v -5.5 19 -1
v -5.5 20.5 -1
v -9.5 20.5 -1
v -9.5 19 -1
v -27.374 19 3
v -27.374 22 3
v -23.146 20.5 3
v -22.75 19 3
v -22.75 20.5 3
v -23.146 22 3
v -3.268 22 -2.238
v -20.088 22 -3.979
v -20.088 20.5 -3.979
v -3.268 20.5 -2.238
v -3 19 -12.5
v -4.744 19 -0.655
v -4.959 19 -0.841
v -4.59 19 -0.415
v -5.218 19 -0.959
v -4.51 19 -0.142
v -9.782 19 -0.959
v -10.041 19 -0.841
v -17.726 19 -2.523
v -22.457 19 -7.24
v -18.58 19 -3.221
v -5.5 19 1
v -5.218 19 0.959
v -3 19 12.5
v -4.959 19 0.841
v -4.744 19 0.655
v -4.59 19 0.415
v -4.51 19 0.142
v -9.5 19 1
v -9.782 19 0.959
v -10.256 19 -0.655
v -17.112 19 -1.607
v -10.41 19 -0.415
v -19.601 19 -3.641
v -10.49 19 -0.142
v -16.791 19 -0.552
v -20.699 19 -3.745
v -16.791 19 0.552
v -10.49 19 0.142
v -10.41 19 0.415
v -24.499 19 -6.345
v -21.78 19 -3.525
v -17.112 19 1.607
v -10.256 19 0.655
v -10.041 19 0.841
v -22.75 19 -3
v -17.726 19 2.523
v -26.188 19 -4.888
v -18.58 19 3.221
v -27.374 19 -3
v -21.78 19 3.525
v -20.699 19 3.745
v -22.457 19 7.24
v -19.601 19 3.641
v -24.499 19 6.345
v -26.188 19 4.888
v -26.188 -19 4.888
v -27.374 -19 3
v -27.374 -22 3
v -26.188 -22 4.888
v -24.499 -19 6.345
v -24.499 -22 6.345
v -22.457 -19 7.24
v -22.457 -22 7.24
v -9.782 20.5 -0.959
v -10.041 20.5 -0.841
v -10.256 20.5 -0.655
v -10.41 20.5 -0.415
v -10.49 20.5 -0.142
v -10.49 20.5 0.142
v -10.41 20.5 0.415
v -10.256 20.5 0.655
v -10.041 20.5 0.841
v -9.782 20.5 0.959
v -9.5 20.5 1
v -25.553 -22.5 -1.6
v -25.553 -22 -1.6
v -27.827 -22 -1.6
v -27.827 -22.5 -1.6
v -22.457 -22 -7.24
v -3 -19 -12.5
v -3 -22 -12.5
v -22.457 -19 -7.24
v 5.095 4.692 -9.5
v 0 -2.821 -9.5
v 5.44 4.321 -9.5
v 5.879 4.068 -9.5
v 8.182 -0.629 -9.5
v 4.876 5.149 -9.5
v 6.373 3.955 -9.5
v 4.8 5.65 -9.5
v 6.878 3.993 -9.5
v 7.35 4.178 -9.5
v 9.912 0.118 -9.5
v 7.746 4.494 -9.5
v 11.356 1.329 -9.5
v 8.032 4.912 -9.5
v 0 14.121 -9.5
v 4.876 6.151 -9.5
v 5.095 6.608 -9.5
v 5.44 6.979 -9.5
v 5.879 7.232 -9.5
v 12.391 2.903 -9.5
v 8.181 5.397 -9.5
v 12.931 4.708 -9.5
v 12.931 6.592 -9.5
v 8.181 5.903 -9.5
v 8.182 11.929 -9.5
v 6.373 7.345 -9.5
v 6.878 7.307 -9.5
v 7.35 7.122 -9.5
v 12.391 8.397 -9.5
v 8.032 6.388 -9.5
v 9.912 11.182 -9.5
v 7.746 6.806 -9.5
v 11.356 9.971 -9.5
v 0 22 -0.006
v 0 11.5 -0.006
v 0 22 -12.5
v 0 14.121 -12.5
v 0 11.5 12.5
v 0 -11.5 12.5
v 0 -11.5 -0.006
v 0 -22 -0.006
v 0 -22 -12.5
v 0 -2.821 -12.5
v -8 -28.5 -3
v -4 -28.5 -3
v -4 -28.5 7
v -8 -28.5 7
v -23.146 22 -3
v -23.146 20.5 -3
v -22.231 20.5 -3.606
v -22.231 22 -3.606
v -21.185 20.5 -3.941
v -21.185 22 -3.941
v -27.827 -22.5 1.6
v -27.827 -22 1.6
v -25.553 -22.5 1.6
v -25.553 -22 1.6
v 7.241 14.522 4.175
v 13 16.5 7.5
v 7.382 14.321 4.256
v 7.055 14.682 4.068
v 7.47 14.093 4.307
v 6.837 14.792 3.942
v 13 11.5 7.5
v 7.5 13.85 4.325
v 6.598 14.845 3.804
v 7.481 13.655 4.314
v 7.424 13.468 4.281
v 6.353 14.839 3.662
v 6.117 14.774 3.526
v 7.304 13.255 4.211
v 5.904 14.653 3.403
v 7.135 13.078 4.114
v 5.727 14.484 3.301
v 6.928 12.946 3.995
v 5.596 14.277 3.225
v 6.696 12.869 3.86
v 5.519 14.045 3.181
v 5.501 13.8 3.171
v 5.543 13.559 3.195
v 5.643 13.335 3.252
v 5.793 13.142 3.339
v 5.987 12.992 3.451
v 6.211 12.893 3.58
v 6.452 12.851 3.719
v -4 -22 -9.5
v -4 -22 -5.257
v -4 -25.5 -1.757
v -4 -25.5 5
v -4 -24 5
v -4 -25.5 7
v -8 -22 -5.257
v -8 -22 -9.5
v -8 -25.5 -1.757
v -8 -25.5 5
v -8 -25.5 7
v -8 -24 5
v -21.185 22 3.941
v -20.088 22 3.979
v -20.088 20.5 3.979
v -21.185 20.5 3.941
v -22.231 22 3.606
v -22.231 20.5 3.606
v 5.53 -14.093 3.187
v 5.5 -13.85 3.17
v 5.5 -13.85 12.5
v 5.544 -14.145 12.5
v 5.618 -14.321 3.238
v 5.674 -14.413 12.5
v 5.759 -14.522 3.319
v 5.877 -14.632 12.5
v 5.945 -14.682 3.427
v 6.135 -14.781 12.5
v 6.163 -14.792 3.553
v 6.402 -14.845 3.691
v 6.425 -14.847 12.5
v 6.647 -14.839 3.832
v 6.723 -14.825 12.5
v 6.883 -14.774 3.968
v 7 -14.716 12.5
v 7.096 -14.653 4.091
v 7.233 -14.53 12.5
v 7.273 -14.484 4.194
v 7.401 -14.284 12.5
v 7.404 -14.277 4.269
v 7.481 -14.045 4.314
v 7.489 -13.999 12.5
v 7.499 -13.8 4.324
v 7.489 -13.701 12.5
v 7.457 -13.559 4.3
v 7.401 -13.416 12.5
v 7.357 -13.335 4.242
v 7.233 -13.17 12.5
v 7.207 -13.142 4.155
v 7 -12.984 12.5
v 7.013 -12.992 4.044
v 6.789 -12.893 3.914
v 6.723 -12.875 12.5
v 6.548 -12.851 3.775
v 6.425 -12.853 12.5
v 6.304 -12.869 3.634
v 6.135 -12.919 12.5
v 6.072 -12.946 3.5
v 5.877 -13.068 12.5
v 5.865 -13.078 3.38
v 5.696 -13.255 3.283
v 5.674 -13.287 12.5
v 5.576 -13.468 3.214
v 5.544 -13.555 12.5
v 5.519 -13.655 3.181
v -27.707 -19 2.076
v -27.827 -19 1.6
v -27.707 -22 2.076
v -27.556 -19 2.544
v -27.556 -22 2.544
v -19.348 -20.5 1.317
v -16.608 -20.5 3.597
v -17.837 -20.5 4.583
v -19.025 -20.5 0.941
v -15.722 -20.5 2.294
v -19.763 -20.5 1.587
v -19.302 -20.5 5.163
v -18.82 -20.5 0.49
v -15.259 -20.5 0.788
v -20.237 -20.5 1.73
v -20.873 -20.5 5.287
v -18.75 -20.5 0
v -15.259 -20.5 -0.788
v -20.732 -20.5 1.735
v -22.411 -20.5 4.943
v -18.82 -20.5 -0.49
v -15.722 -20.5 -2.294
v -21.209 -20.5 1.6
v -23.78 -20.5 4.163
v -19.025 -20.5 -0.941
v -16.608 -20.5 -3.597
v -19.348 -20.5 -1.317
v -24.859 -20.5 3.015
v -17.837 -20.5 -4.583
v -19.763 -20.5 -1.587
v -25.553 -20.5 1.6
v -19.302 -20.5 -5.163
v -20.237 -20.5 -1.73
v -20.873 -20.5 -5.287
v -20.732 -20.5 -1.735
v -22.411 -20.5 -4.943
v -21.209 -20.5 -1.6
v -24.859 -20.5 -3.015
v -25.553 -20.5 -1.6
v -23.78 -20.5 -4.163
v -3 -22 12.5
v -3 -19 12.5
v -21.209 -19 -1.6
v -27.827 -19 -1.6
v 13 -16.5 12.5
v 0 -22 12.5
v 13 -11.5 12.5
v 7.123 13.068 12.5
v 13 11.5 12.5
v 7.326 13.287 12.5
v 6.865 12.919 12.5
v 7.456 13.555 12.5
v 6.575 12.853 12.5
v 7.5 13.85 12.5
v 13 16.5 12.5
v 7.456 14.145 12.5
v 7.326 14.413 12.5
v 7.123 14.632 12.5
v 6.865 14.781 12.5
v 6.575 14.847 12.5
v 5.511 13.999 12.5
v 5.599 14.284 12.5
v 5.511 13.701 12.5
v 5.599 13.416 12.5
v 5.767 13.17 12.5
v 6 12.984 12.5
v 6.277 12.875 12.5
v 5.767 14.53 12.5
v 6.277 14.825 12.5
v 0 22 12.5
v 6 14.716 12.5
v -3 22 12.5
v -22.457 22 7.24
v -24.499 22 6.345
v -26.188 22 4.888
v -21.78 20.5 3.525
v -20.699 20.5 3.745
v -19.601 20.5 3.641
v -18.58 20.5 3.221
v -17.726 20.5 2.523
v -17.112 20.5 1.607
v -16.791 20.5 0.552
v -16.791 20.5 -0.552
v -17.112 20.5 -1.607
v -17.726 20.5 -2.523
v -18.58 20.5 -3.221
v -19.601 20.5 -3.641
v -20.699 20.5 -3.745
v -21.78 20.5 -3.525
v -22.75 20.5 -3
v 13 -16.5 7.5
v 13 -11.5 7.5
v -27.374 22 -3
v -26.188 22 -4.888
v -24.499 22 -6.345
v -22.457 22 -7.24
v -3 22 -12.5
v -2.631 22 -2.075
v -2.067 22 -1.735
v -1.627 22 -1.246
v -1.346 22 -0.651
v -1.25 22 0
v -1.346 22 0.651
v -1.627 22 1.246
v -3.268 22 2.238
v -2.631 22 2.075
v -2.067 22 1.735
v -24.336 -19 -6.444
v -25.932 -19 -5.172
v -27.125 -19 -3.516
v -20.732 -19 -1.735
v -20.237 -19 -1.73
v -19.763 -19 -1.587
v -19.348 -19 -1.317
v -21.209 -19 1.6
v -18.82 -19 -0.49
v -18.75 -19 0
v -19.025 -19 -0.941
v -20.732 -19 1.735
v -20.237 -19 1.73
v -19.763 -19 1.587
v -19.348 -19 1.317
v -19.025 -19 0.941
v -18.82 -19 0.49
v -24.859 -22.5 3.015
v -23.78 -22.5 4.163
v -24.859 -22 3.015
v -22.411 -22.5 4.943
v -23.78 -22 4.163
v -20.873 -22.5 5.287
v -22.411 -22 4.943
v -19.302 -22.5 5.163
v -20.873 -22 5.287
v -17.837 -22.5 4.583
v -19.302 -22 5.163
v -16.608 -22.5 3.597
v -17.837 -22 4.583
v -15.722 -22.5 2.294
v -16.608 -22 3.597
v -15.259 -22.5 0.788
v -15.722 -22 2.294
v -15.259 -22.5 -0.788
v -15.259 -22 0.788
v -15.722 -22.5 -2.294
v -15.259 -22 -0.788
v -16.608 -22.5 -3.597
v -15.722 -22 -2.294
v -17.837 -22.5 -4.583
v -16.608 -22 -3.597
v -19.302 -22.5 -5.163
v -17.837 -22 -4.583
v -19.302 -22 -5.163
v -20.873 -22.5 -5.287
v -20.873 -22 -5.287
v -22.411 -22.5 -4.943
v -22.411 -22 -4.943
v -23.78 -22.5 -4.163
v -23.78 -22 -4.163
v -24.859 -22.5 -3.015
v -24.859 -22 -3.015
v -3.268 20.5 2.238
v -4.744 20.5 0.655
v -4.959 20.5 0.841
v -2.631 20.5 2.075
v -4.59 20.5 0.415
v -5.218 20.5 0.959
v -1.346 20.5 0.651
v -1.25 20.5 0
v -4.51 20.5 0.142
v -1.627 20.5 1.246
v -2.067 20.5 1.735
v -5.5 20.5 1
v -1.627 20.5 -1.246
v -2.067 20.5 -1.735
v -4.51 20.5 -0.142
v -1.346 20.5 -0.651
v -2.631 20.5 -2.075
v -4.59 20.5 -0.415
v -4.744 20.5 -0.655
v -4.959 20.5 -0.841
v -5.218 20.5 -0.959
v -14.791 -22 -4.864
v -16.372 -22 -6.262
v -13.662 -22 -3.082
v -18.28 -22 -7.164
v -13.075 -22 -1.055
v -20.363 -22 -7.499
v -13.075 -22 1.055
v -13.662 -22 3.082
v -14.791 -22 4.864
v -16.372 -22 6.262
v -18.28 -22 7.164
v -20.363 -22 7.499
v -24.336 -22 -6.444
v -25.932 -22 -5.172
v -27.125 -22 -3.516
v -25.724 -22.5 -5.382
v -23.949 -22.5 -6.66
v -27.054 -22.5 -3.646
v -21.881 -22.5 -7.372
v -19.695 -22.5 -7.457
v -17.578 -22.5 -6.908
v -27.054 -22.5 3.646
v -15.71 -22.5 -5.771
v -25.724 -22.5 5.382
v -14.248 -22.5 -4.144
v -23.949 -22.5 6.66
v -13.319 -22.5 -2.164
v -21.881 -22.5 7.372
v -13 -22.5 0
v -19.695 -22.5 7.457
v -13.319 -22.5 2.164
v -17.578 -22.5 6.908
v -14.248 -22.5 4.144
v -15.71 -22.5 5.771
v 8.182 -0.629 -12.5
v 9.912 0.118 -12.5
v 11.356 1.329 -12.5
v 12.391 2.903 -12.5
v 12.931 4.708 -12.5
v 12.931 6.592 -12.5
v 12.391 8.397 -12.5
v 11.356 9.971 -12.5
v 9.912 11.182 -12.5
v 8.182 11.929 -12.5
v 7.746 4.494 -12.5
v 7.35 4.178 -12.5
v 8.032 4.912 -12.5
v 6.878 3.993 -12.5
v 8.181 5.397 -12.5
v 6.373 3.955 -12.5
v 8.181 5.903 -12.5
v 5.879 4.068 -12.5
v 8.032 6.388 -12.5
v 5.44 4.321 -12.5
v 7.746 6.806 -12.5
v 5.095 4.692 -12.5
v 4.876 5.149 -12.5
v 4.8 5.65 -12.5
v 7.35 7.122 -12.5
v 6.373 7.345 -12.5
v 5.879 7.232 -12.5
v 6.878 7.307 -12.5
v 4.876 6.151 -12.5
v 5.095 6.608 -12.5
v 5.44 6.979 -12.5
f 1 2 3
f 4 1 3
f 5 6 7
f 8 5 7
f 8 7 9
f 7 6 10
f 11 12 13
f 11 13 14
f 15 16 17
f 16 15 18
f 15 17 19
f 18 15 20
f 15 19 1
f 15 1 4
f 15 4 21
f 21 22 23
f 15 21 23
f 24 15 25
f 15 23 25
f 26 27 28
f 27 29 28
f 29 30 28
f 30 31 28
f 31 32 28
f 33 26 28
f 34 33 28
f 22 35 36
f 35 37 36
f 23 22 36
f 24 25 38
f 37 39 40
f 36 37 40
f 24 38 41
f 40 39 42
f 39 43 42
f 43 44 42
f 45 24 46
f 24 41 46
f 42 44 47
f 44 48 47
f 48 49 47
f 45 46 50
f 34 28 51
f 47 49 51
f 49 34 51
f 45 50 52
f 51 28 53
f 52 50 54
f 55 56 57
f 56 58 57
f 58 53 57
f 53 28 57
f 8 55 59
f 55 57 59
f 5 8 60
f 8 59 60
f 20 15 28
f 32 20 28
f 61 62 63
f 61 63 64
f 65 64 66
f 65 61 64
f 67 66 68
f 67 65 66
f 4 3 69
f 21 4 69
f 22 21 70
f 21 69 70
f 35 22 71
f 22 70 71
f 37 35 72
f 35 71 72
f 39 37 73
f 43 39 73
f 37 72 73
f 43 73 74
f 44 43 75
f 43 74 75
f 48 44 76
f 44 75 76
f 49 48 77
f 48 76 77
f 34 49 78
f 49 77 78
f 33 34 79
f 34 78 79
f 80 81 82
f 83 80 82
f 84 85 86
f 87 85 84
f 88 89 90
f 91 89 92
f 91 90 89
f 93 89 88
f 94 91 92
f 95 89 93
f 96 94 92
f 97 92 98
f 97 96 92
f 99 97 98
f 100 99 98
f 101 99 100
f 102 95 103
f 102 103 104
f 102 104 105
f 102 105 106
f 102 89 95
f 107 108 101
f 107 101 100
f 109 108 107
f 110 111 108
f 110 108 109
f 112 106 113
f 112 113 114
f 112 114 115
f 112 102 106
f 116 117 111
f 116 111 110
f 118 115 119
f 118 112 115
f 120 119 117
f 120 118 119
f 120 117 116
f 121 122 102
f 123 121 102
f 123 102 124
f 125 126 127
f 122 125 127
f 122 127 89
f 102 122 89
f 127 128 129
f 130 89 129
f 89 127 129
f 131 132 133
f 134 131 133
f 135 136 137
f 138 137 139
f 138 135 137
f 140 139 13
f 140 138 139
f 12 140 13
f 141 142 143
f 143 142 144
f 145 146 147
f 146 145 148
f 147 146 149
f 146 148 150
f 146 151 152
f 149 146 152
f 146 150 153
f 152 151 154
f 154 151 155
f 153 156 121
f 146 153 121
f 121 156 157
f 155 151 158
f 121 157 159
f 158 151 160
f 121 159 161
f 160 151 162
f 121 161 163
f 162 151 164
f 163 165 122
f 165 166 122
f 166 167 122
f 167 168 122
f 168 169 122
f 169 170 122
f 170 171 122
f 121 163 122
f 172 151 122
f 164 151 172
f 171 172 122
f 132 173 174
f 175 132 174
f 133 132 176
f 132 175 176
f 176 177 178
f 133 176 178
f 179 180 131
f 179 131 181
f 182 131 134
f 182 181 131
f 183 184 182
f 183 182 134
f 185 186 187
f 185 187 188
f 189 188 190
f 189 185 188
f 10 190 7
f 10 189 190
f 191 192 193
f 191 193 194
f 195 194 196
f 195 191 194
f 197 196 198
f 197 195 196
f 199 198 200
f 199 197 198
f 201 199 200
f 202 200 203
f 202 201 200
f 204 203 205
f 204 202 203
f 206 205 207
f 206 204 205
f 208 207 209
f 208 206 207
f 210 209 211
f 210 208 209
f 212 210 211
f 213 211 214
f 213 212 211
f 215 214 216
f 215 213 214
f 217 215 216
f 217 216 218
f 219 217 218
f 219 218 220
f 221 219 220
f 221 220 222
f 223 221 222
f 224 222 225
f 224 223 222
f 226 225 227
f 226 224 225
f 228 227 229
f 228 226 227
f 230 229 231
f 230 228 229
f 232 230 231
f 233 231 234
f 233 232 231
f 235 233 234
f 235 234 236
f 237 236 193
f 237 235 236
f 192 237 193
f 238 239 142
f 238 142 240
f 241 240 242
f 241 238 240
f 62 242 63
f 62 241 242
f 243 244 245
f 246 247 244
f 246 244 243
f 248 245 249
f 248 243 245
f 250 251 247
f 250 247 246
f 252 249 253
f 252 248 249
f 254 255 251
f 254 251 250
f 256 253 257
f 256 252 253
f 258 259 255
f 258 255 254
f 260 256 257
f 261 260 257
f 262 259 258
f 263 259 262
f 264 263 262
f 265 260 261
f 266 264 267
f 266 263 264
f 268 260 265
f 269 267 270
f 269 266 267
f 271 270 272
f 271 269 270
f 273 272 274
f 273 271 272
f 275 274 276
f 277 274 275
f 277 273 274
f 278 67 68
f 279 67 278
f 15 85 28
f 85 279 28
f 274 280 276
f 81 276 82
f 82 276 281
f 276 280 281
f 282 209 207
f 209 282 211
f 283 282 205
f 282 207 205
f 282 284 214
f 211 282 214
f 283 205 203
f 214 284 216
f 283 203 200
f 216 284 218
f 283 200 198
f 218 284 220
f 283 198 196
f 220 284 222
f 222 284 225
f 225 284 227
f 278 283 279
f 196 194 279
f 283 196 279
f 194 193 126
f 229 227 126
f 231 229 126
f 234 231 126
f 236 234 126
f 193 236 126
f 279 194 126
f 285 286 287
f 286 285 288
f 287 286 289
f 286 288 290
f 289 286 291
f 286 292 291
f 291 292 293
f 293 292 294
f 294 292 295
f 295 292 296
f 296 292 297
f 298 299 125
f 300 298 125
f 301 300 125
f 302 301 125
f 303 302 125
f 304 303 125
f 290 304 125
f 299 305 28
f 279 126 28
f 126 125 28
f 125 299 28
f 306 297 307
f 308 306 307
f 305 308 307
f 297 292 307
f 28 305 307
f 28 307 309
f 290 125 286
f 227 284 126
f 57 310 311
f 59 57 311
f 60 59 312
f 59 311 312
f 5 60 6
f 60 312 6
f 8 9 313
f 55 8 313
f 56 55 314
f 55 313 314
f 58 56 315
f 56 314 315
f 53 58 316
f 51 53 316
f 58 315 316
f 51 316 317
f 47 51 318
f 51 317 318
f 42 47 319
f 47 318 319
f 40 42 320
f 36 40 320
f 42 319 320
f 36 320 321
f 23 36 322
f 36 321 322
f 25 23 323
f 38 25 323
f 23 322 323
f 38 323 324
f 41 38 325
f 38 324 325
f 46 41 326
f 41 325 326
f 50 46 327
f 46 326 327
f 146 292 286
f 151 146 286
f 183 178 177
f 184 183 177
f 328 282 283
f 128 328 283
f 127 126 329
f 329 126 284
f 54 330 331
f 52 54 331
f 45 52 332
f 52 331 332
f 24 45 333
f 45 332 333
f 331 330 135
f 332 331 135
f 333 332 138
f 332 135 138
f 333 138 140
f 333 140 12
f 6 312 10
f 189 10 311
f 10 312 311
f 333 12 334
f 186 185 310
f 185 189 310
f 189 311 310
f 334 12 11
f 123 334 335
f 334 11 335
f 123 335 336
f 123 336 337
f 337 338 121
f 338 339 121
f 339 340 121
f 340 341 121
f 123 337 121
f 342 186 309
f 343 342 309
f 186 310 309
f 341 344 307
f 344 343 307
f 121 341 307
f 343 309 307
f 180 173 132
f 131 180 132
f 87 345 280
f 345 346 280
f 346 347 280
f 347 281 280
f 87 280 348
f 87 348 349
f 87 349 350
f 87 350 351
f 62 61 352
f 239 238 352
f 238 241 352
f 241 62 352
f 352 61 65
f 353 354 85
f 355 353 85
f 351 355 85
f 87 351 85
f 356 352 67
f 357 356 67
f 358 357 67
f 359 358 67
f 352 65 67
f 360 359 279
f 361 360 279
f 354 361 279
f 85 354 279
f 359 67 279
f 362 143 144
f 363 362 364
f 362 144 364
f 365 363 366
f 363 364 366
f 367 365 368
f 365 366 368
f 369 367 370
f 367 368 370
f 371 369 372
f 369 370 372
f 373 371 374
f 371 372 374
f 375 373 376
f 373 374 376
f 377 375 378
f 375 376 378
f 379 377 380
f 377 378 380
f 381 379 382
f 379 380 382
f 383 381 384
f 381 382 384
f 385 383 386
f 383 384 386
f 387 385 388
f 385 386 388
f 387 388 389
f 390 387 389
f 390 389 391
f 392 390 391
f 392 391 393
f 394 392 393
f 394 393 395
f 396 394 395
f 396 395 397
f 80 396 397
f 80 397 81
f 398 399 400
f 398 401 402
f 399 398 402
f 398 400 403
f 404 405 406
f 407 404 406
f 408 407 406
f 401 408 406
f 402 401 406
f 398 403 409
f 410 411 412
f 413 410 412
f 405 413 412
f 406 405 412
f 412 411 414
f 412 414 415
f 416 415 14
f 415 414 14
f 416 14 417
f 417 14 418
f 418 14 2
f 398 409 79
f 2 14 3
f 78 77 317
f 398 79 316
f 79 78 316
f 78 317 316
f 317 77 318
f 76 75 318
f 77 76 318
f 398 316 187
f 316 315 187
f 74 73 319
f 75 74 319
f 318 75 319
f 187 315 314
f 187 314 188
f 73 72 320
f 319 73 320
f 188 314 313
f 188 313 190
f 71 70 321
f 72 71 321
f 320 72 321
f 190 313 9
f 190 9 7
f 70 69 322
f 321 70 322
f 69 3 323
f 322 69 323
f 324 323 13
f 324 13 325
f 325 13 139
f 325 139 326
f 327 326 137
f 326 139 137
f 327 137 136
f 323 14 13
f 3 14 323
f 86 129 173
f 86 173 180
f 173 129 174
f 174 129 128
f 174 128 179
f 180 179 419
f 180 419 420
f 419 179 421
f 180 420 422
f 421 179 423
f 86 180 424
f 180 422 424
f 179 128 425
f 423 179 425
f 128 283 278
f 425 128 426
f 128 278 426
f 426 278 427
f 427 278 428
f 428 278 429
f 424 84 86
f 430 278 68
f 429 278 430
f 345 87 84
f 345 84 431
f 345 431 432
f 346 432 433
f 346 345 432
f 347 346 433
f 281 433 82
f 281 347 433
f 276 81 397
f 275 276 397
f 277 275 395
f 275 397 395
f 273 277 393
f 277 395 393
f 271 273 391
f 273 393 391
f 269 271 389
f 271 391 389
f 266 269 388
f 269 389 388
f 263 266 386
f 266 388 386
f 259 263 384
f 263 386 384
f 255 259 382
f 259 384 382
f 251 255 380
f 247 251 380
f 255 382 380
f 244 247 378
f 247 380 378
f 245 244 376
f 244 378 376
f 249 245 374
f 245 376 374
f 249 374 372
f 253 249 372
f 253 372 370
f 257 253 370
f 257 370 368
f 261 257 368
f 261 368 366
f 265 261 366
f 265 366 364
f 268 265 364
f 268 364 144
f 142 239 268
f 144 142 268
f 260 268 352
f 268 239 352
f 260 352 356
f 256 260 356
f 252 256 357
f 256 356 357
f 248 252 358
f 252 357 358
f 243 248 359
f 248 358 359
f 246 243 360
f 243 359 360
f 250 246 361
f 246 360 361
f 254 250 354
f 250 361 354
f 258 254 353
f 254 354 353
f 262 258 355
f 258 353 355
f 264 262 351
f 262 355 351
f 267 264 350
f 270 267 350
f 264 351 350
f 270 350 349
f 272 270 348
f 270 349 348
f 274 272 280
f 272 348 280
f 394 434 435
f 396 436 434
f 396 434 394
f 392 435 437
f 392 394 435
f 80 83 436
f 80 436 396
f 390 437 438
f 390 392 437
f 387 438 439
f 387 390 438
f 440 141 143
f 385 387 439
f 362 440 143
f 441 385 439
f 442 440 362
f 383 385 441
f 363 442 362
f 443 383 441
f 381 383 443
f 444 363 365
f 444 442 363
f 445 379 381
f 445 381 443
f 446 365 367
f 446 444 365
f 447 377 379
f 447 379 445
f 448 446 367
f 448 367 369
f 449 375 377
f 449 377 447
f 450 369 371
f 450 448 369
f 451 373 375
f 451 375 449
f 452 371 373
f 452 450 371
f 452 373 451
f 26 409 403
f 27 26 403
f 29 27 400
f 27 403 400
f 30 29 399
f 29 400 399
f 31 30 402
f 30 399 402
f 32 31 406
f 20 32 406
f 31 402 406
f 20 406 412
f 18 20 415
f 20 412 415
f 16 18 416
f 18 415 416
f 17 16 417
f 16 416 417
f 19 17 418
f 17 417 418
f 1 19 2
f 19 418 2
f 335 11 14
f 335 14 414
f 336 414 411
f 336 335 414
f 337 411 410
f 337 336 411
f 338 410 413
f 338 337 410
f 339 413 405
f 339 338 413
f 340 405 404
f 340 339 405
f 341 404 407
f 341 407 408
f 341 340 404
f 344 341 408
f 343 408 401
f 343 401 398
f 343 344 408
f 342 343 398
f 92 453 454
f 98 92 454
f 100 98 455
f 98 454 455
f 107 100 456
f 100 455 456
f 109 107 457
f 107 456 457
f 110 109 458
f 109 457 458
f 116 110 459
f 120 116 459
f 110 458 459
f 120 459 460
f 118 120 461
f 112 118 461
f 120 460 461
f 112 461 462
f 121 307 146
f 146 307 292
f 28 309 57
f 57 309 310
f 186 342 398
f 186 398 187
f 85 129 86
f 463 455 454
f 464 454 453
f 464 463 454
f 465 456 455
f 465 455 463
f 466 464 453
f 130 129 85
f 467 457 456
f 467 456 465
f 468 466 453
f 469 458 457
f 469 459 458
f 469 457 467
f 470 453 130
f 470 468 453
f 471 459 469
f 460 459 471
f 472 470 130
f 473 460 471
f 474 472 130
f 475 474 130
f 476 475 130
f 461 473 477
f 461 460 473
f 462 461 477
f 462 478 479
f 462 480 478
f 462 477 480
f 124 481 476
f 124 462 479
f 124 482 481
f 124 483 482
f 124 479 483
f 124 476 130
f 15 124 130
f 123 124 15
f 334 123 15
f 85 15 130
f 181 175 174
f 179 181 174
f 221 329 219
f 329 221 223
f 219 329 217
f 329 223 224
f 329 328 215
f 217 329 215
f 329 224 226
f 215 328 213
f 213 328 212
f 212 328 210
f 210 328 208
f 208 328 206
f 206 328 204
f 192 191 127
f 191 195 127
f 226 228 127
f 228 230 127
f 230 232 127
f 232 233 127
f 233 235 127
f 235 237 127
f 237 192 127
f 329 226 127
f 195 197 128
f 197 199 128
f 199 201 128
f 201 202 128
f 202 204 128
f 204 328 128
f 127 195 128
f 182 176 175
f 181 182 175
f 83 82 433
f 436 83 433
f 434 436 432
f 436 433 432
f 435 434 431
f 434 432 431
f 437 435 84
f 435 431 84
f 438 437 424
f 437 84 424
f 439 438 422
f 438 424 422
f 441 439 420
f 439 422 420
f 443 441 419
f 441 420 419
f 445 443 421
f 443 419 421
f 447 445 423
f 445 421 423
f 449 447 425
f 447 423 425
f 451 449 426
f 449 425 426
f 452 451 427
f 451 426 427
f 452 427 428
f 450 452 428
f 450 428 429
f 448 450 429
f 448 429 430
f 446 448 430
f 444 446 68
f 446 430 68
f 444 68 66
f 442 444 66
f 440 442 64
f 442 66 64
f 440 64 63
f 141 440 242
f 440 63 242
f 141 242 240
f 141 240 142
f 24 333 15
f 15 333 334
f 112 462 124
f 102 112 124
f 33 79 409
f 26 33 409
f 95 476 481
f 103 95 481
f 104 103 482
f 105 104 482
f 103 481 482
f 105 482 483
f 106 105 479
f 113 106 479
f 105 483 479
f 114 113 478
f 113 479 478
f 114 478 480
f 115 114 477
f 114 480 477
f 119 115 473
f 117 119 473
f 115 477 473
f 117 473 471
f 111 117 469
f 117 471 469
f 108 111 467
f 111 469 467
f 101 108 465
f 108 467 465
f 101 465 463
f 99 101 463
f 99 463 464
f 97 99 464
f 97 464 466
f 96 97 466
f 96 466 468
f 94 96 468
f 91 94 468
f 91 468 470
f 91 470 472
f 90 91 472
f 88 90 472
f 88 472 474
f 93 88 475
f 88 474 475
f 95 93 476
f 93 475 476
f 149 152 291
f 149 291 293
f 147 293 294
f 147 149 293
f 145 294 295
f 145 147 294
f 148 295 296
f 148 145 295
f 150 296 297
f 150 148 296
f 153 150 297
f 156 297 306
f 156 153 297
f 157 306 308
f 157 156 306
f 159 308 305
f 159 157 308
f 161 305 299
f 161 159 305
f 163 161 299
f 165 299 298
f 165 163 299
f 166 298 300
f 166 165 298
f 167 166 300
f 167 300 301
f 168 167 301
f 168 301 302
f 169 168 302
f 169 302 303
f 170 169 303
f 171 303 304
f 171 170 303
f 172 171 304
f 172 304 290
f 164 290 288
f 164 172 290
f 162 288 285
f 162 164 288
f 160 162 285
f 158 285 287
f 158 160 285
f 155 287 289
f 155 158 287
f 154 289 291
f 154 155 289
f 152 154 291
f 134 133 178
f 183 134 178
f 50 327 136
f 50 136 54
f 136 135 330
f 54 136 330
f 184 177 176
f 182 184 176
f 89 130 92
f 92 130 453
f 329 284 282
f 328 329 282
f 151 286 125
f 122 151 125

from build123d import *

# Parameters (mm, degrees)
ESBO_O1_R                  = 1
RESSALTO_EXTRUS_O1_DEPTH   = 12.5
CORTE_EXTRUS_O1_DEPTH      = 15
CORTE_EXTRUS_O2_DEPTH      = 49.656962503
CORTE_EXTRUS_O2_DEPTH_BACK = 49.656962503
ESBO_O5_R                  = 1.7
RESSALTO_EXTRUS_O2_DEPTH   = 3
CORTE_EXTRUS_O3_DEPTH      = 10
CORTE_EXTRUS_O4_DEPTH      = 57.402570863
RESSALTO_EXTRUS_O3_START   = -4
RESSALTO_EXTRUS_O3_DEPTH   = 4
ESBO_O9_R                  = 5.3
CORTE_EXTRUS_O5_DEPTH      = 1.5
RESSALTO_EXTRUS_O4_DEPTH   = 0.5
CORTE_EXTRUS_O6_DEPTH      = 1.5


with BuildPart() as part:
    # Esboço1 → Ressalto-extrusão1 (new, symmetric)
    with BuildSketch(Plane.XY):
        Polygon((0, -22), (-33, -22), (-33, -19), (-3, -19), (-3, 19), (-33, 19), (-33, 22), (0, 22), (13, 16.5), (13, 11.5), (0, 11.5), (0, -11.5), (13, -11.5), (13, -16.5), align=None)
        with Locations((6.5, 13.85)):
            Circle(ESBO_O1_R, mode=Mode.SUBTRACT)
        with Locations((6.5, -13.85)):
            Circle(ESBO_O1_R, mode=Mode.SUBTRACT)
    extrude(amount=RESSALTO_EXTRUS_O1_DEPTH, both=True)

    # Esboço2 → Corte-extrusão1 (cut)
    with BuildSketch(Plane(origin=(0, 22, 0), x_dir=(1, 0, 0), z_dir=(0, 1, 0))):
        with BuildLine():
            Line((-22.45722521, 7.240115294), (-3, 12.5))
            Line((-3, 12.5), (-33, 12.5))
            Line((-33, 12.5), (-33, -12.5))
            Line((-33, -12.5), (-3, -12.5))
            Line((-3, -12.5), (-22.45722521, -7.240115294))
            ThreePointArc((-22.45722521, -7.240115294), (-25.398129905, -5.679641136), (-27.373863542, -3))
            Line((-27.373863542, -3), (-22.75, -3))
            ThreePointArc((-22.75, -3), (-16.75, 0), (-22.75, 3))
            Line((-22.75, 3), (-27.373863542, 3))
            ThreePointArc((-27.373863542, 3), (-25.398129905, 5.679641136), (-22.45722521, 7.240115294))
        make_face()
        with BuildLine():
            Line((-5.5, 1), (-9.5, 1))
            ThreePointArc((-9.5, 1), (-10.5, 0), (-9.5, -1))
            Line((-9.5, -1), (-5.5, -1))
            ThreePointArc((-5.5, -1), (-4.5, 0), (-5.5, 1))
        make_face()
    extrude(amount=-CORTE_EXTRUS_O1_DEPTH, mode=Mode.SUBTRACT)

    # Esboço4 → Corte-extrusão2 (cut, two sides: drawn at the far end of the back side and taken through both)
    with BuildSketch(Plane(origin=(0, -11.5, 0), x_dir=(1, 0, 0), z_dir=(0, 1, 0)).offset(-CORTE_EXTRUS_O2_DEPTH_BACK)):
        Polygon((13, -7.5), (0, 0.005553499), (0, 12.5), (13, 12.5), align=None)
    extrude(amount=CORTE_EXTRUS_O2_DEPTH + CORTE_EXTRUS_O2_DEPTH_BACK, mode=Mode.SUBTRACT)

    # Esboço5 → Ressalto-extrusão2 (add)
    with BuildSketch(Plane(origin=(0, 0, -12.5), x_dir=(-1, 0, 0), z_dir=(0, 0, -1))):
        with BuildLine():
            Line((-8.182323793, 11.928517871), (0, 14.120964923))
            Line((0, 14.120964923), (0, -2.820964923))
            Line((0, -2.820964923), (-8.182323793, -0.628517871))
            ThreePointArc((-8.182323793, -0.628517871), (-13, 5.65), (-8.182323793, 11.928517871))
        make_face()
        with Locations((-6.5, 5.65)):
            Circle(ESBO_O5_R, mode=Mode.SUBTRACT)
    extrude(amount=-RESSALTO_EXTRUS_O2_DEPTH)

    # Esboço7 → Corte-extrusão3 (cut)
    with BuildSketch(Plane(origin=(0, -19, 0), x_dir=(1, 0, 0), z_dir=(0, 1, 0))):
        with BuildLine():
            Line((-21.208872344, 1.6), (-33, 1.6))
            Line((-33, 1.6), (-33, -1.6))
            Line((-33, -1.6), (-21.208872344, -1.6))
            ThreePointArc((-21.208872344, -1.6), (-18.75, 0), (-21.208872344, 1.6))
        make_face()
    extrude(amount=-CORTE_EXTRUS_O3_DEPTH, mode=Mode.SUBTRACT)

    # Esboço2<2> → Corte-extrusão4 (cut, through all)
    with BuildSketch(Plane(origin=(0, 22, 0), x_dir=(1, 0, 0), z_dir=(0, 1, 0))):
        with BuildLine():
            Line((-22.45722521, 7.240115294), (-3, 12.5))
            Line((-3, 12.5), (-33, 12.5))
            Line((-33, 12.5), (-33, -12.5))
            Line((-33, -12.5), (-3, -12.5))
            Line((-3, -12.5), (-22.45722521, -7.240115294))
            ThreePointArc((-22.45722521, -7.240115294), (-25.398129905, -5.679641136), (-27.373863542, -3))
            ThreePointArc((-27.373863542, -3), (-28, 0), (-27.373863542, 3))
            ThreePointArc((-27.373863542, 3), (-25.398129905, 5.679641136), (-22.45722521, 7.240115294))
        make_face()
    extrude(amount=-CORTE_EXTRUS_O4_DEPTH, mode=Mode.SUBTRACT)

    # Esboço8 → Ressalto-extrusão3 (add)
    with BuildSketch(Plane(origin=(0, 0, 0), x_dir=(0, 0, -1), z_dir=(1, 0, 0)).offset(RESSALTO_EXTRUS_O3_START)):
        Polygon((10, -21.5), (3, -28.5), (-7, -28.5), (-7, -25.5), (-5, -24), (-5, -25.5), (1.757359313, -25.5), (5.757359313, -21.5), align=None)
    extrude(amount=-RESSALTO_EXTRUS_O3_DEPTH)

    # Esboço9 → Corte-extrusão5 (cut)
    with BuildSketch(Plane(origin=(0, -22, 0), x_dir=(-1, 0, 0), z_dir=(0, -1, 0))):
        with Locations((20.5, 0)):
            Circle(ESBO_O9_R)
    extrude(amount=-CORTE_EXTRUS_O5_DEPTH, mode=Mode.SUBTRACT)

    # Esboço10 → Ressalto-extrusão4 (add)
    with BuildSketch(Plane.XZ.offset(22)):
        with BuildLine():
            Line((-27.827346041, 1.6), (-25.552722039, 1.6))
            ThreePointArc((-25.552722039, 1.6), (-15.2, 0), (-25.552722039, -1.6))
            Line((-25.552722039, -1.6), (-27.827346041, -1.6))
            ThreePointArc((-27.827346041, -1.6), (-13, 0), (-27.827346041, 1.6))
        make_face()
    extrude(amount=RESSALTO_EXTRUS_O4_DEPTH)

    # Esboço11 → Corte-extrusão6 (cut)
    with BuildSketch(Plane(origin=(0, 22, 0), x_dir=(1, 0, 0), z_dir=(0, 1, 0))):
        with BuildLine():
            Line((-20.088235294, 3.978749782), (-3.268382353, 2.238046752))
            ThreePointArc((-3.268382353, 2.238046752), (-1.25, 0), (-3.268382353, -2.238046752))
            Line((-3.268382353, -2.238046752), (-20.088235294, -3.978749782))
            ThreePointArc((-20.088235294, -3.978749782), (-24.5, 0), (-20.088235294, 3.978749782))
        make_face()
    extrude(amount=-CORTE_EXTRUS_O6_DEPTH, mode=Mode.SUBTRACT)


solid = part.part
